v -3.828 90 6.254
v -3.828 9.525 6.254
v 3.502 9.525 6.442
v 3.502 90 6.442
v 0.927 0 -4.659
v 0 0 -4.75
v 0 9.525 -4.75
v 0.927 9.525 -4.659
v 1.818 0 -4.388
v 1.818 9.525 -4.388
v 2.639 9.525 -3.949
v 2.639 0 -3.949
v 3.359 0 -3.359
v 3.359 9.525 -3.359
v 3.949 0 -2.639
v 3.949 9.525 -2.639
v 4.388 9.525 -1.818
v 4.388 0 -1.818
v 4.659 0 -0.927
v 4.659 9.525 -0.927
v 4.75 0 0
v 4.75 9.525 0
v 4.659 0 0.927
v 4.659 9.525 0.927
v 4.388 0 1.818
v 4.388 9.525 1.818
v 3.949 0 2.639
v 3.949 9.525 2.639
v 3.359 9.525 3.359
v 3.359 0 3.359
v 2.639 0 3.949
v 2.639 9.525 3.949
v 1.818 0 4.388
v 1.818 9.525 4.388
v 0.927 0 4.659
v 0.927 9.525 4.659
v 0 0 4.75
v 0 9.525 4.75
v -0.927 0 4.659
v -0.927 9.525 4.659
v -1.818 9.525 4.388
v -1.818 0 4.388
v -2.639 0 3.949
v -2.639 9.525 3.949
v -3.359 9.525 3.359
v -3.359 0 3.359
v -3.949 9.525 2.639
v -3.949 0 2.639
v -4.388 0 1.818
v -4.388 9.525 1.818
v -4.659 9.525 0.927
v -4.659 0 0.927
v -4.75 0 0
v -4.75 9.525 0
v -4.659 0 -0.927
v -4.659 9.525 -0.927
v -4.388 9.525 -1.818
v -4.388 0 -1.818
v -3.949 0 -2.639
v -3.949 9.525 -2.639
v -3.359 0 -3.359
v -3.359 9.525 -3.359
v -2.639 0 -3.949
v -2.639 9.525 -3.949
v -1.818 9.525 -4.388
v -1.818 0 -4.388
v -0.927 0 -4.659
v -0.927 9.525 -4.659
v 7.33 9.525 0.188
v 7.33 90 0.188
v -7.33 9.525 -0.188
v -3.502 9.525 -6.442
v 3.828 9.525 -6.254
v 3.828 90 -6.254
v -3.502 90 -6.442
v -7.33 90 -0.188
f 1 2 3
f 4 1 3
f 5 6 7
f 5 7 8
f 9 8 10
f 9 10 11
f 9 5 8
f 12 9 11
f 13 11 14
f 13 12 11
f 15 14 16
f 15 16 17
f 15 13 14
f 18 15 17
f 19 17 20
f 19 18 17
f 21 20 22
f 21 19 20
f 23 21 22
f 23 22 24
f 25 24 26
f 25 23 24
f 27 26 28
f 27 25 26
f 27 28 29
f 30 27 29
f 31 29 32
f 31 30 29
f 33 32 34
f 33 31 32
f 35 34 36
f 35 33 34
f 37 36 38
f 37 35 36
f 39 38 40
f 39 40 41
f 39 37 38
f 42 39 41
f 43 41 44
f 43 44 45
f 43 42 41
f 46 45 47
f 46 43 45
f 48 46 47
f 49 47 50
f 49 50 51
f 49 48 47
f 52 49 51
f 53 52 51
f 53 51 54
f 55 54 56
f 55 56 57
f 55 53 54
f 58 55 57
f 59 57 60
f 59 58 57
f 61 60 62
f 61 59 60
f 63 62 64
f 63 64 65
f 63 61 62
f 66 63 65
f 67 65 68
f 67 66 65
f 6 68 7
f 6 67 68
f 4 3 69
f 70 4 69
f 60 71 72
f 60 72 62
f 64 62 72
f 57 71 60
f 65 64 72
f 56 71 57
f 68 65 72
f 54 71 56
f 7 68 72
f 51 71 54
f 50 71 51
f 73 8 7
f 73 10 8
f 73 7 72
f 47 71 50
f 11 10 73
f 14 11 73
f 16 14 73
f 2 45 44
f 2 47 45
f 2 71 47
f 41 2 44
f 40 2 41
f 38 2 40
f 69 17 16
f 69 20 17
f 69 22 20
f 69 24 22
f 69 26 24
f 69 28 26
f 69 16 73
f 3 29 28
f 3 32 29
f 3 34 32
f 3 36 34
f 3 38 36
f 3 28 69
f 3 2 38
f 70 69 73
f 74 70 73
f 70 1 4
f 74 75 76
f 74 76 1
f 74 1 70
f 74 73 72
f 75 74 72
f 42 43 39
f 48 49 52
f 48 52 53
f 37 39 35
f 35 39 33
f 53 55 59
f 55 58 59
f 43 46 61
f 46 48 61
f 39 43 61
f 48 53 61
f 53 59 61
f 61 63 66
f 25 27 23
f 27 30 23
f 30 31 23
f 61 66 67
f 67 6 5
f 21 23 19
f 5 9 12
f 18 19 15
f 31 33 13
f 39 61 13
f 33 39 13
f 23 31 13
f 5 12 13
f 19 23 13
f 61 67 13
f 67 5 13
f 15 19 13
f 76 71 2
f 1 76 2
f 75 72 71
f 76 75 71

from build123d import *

# Parameters (mm, degrees)
SALIENTE_EXTRUIR1_DEPTH = 90
CROQUIS2_OUTSIDE_W      = 35.078
CROQUIS2_OUTSIDE_H      = 33.302
CROQUIS2_OUTSIDE_R      = 4.75
CORTAR_EXTRUIR1_DEPTH   = 9.525


with BuildPart() as part:
    # Croquis1 → Saliente-Extruir1 (new body)
    with BuildSketch(Plane(origin=(0, 0, 0), x_dir=(1, 0, 0), z_dir=(0, 1, 0))):
        Polygon((3.502287207, -6.44184117), (7.329941703, -0.187850892), (3.827654496, 6.253990277), (-3.502287207, 6.44184117), (-7.329941703, 0.187850892), (-3.827654496, -6.253990277), align=None)
    extrude(amount=SALIENTE_EXTRUIR1_DEPTH)

    # Croquis2 outside → Cortar-Extruir1 (cut)
    with BuildSketch(Plane.XZ):
        Rectangle(CROQUIS2_OUTSIDE_W, CROQUIS2_OUTSIDE_H)
        with Locations(Location((0, 0, 0), (0, 0, 270))):
            Circle(CROQUIS2_OUTSIDE_R, mode=Mode.SUBTRACT)
    extrude(amount=-CORTAR_EXTRUIR1_DEPTH, mode=Mode.SUBTRACT)


solid = part.part
